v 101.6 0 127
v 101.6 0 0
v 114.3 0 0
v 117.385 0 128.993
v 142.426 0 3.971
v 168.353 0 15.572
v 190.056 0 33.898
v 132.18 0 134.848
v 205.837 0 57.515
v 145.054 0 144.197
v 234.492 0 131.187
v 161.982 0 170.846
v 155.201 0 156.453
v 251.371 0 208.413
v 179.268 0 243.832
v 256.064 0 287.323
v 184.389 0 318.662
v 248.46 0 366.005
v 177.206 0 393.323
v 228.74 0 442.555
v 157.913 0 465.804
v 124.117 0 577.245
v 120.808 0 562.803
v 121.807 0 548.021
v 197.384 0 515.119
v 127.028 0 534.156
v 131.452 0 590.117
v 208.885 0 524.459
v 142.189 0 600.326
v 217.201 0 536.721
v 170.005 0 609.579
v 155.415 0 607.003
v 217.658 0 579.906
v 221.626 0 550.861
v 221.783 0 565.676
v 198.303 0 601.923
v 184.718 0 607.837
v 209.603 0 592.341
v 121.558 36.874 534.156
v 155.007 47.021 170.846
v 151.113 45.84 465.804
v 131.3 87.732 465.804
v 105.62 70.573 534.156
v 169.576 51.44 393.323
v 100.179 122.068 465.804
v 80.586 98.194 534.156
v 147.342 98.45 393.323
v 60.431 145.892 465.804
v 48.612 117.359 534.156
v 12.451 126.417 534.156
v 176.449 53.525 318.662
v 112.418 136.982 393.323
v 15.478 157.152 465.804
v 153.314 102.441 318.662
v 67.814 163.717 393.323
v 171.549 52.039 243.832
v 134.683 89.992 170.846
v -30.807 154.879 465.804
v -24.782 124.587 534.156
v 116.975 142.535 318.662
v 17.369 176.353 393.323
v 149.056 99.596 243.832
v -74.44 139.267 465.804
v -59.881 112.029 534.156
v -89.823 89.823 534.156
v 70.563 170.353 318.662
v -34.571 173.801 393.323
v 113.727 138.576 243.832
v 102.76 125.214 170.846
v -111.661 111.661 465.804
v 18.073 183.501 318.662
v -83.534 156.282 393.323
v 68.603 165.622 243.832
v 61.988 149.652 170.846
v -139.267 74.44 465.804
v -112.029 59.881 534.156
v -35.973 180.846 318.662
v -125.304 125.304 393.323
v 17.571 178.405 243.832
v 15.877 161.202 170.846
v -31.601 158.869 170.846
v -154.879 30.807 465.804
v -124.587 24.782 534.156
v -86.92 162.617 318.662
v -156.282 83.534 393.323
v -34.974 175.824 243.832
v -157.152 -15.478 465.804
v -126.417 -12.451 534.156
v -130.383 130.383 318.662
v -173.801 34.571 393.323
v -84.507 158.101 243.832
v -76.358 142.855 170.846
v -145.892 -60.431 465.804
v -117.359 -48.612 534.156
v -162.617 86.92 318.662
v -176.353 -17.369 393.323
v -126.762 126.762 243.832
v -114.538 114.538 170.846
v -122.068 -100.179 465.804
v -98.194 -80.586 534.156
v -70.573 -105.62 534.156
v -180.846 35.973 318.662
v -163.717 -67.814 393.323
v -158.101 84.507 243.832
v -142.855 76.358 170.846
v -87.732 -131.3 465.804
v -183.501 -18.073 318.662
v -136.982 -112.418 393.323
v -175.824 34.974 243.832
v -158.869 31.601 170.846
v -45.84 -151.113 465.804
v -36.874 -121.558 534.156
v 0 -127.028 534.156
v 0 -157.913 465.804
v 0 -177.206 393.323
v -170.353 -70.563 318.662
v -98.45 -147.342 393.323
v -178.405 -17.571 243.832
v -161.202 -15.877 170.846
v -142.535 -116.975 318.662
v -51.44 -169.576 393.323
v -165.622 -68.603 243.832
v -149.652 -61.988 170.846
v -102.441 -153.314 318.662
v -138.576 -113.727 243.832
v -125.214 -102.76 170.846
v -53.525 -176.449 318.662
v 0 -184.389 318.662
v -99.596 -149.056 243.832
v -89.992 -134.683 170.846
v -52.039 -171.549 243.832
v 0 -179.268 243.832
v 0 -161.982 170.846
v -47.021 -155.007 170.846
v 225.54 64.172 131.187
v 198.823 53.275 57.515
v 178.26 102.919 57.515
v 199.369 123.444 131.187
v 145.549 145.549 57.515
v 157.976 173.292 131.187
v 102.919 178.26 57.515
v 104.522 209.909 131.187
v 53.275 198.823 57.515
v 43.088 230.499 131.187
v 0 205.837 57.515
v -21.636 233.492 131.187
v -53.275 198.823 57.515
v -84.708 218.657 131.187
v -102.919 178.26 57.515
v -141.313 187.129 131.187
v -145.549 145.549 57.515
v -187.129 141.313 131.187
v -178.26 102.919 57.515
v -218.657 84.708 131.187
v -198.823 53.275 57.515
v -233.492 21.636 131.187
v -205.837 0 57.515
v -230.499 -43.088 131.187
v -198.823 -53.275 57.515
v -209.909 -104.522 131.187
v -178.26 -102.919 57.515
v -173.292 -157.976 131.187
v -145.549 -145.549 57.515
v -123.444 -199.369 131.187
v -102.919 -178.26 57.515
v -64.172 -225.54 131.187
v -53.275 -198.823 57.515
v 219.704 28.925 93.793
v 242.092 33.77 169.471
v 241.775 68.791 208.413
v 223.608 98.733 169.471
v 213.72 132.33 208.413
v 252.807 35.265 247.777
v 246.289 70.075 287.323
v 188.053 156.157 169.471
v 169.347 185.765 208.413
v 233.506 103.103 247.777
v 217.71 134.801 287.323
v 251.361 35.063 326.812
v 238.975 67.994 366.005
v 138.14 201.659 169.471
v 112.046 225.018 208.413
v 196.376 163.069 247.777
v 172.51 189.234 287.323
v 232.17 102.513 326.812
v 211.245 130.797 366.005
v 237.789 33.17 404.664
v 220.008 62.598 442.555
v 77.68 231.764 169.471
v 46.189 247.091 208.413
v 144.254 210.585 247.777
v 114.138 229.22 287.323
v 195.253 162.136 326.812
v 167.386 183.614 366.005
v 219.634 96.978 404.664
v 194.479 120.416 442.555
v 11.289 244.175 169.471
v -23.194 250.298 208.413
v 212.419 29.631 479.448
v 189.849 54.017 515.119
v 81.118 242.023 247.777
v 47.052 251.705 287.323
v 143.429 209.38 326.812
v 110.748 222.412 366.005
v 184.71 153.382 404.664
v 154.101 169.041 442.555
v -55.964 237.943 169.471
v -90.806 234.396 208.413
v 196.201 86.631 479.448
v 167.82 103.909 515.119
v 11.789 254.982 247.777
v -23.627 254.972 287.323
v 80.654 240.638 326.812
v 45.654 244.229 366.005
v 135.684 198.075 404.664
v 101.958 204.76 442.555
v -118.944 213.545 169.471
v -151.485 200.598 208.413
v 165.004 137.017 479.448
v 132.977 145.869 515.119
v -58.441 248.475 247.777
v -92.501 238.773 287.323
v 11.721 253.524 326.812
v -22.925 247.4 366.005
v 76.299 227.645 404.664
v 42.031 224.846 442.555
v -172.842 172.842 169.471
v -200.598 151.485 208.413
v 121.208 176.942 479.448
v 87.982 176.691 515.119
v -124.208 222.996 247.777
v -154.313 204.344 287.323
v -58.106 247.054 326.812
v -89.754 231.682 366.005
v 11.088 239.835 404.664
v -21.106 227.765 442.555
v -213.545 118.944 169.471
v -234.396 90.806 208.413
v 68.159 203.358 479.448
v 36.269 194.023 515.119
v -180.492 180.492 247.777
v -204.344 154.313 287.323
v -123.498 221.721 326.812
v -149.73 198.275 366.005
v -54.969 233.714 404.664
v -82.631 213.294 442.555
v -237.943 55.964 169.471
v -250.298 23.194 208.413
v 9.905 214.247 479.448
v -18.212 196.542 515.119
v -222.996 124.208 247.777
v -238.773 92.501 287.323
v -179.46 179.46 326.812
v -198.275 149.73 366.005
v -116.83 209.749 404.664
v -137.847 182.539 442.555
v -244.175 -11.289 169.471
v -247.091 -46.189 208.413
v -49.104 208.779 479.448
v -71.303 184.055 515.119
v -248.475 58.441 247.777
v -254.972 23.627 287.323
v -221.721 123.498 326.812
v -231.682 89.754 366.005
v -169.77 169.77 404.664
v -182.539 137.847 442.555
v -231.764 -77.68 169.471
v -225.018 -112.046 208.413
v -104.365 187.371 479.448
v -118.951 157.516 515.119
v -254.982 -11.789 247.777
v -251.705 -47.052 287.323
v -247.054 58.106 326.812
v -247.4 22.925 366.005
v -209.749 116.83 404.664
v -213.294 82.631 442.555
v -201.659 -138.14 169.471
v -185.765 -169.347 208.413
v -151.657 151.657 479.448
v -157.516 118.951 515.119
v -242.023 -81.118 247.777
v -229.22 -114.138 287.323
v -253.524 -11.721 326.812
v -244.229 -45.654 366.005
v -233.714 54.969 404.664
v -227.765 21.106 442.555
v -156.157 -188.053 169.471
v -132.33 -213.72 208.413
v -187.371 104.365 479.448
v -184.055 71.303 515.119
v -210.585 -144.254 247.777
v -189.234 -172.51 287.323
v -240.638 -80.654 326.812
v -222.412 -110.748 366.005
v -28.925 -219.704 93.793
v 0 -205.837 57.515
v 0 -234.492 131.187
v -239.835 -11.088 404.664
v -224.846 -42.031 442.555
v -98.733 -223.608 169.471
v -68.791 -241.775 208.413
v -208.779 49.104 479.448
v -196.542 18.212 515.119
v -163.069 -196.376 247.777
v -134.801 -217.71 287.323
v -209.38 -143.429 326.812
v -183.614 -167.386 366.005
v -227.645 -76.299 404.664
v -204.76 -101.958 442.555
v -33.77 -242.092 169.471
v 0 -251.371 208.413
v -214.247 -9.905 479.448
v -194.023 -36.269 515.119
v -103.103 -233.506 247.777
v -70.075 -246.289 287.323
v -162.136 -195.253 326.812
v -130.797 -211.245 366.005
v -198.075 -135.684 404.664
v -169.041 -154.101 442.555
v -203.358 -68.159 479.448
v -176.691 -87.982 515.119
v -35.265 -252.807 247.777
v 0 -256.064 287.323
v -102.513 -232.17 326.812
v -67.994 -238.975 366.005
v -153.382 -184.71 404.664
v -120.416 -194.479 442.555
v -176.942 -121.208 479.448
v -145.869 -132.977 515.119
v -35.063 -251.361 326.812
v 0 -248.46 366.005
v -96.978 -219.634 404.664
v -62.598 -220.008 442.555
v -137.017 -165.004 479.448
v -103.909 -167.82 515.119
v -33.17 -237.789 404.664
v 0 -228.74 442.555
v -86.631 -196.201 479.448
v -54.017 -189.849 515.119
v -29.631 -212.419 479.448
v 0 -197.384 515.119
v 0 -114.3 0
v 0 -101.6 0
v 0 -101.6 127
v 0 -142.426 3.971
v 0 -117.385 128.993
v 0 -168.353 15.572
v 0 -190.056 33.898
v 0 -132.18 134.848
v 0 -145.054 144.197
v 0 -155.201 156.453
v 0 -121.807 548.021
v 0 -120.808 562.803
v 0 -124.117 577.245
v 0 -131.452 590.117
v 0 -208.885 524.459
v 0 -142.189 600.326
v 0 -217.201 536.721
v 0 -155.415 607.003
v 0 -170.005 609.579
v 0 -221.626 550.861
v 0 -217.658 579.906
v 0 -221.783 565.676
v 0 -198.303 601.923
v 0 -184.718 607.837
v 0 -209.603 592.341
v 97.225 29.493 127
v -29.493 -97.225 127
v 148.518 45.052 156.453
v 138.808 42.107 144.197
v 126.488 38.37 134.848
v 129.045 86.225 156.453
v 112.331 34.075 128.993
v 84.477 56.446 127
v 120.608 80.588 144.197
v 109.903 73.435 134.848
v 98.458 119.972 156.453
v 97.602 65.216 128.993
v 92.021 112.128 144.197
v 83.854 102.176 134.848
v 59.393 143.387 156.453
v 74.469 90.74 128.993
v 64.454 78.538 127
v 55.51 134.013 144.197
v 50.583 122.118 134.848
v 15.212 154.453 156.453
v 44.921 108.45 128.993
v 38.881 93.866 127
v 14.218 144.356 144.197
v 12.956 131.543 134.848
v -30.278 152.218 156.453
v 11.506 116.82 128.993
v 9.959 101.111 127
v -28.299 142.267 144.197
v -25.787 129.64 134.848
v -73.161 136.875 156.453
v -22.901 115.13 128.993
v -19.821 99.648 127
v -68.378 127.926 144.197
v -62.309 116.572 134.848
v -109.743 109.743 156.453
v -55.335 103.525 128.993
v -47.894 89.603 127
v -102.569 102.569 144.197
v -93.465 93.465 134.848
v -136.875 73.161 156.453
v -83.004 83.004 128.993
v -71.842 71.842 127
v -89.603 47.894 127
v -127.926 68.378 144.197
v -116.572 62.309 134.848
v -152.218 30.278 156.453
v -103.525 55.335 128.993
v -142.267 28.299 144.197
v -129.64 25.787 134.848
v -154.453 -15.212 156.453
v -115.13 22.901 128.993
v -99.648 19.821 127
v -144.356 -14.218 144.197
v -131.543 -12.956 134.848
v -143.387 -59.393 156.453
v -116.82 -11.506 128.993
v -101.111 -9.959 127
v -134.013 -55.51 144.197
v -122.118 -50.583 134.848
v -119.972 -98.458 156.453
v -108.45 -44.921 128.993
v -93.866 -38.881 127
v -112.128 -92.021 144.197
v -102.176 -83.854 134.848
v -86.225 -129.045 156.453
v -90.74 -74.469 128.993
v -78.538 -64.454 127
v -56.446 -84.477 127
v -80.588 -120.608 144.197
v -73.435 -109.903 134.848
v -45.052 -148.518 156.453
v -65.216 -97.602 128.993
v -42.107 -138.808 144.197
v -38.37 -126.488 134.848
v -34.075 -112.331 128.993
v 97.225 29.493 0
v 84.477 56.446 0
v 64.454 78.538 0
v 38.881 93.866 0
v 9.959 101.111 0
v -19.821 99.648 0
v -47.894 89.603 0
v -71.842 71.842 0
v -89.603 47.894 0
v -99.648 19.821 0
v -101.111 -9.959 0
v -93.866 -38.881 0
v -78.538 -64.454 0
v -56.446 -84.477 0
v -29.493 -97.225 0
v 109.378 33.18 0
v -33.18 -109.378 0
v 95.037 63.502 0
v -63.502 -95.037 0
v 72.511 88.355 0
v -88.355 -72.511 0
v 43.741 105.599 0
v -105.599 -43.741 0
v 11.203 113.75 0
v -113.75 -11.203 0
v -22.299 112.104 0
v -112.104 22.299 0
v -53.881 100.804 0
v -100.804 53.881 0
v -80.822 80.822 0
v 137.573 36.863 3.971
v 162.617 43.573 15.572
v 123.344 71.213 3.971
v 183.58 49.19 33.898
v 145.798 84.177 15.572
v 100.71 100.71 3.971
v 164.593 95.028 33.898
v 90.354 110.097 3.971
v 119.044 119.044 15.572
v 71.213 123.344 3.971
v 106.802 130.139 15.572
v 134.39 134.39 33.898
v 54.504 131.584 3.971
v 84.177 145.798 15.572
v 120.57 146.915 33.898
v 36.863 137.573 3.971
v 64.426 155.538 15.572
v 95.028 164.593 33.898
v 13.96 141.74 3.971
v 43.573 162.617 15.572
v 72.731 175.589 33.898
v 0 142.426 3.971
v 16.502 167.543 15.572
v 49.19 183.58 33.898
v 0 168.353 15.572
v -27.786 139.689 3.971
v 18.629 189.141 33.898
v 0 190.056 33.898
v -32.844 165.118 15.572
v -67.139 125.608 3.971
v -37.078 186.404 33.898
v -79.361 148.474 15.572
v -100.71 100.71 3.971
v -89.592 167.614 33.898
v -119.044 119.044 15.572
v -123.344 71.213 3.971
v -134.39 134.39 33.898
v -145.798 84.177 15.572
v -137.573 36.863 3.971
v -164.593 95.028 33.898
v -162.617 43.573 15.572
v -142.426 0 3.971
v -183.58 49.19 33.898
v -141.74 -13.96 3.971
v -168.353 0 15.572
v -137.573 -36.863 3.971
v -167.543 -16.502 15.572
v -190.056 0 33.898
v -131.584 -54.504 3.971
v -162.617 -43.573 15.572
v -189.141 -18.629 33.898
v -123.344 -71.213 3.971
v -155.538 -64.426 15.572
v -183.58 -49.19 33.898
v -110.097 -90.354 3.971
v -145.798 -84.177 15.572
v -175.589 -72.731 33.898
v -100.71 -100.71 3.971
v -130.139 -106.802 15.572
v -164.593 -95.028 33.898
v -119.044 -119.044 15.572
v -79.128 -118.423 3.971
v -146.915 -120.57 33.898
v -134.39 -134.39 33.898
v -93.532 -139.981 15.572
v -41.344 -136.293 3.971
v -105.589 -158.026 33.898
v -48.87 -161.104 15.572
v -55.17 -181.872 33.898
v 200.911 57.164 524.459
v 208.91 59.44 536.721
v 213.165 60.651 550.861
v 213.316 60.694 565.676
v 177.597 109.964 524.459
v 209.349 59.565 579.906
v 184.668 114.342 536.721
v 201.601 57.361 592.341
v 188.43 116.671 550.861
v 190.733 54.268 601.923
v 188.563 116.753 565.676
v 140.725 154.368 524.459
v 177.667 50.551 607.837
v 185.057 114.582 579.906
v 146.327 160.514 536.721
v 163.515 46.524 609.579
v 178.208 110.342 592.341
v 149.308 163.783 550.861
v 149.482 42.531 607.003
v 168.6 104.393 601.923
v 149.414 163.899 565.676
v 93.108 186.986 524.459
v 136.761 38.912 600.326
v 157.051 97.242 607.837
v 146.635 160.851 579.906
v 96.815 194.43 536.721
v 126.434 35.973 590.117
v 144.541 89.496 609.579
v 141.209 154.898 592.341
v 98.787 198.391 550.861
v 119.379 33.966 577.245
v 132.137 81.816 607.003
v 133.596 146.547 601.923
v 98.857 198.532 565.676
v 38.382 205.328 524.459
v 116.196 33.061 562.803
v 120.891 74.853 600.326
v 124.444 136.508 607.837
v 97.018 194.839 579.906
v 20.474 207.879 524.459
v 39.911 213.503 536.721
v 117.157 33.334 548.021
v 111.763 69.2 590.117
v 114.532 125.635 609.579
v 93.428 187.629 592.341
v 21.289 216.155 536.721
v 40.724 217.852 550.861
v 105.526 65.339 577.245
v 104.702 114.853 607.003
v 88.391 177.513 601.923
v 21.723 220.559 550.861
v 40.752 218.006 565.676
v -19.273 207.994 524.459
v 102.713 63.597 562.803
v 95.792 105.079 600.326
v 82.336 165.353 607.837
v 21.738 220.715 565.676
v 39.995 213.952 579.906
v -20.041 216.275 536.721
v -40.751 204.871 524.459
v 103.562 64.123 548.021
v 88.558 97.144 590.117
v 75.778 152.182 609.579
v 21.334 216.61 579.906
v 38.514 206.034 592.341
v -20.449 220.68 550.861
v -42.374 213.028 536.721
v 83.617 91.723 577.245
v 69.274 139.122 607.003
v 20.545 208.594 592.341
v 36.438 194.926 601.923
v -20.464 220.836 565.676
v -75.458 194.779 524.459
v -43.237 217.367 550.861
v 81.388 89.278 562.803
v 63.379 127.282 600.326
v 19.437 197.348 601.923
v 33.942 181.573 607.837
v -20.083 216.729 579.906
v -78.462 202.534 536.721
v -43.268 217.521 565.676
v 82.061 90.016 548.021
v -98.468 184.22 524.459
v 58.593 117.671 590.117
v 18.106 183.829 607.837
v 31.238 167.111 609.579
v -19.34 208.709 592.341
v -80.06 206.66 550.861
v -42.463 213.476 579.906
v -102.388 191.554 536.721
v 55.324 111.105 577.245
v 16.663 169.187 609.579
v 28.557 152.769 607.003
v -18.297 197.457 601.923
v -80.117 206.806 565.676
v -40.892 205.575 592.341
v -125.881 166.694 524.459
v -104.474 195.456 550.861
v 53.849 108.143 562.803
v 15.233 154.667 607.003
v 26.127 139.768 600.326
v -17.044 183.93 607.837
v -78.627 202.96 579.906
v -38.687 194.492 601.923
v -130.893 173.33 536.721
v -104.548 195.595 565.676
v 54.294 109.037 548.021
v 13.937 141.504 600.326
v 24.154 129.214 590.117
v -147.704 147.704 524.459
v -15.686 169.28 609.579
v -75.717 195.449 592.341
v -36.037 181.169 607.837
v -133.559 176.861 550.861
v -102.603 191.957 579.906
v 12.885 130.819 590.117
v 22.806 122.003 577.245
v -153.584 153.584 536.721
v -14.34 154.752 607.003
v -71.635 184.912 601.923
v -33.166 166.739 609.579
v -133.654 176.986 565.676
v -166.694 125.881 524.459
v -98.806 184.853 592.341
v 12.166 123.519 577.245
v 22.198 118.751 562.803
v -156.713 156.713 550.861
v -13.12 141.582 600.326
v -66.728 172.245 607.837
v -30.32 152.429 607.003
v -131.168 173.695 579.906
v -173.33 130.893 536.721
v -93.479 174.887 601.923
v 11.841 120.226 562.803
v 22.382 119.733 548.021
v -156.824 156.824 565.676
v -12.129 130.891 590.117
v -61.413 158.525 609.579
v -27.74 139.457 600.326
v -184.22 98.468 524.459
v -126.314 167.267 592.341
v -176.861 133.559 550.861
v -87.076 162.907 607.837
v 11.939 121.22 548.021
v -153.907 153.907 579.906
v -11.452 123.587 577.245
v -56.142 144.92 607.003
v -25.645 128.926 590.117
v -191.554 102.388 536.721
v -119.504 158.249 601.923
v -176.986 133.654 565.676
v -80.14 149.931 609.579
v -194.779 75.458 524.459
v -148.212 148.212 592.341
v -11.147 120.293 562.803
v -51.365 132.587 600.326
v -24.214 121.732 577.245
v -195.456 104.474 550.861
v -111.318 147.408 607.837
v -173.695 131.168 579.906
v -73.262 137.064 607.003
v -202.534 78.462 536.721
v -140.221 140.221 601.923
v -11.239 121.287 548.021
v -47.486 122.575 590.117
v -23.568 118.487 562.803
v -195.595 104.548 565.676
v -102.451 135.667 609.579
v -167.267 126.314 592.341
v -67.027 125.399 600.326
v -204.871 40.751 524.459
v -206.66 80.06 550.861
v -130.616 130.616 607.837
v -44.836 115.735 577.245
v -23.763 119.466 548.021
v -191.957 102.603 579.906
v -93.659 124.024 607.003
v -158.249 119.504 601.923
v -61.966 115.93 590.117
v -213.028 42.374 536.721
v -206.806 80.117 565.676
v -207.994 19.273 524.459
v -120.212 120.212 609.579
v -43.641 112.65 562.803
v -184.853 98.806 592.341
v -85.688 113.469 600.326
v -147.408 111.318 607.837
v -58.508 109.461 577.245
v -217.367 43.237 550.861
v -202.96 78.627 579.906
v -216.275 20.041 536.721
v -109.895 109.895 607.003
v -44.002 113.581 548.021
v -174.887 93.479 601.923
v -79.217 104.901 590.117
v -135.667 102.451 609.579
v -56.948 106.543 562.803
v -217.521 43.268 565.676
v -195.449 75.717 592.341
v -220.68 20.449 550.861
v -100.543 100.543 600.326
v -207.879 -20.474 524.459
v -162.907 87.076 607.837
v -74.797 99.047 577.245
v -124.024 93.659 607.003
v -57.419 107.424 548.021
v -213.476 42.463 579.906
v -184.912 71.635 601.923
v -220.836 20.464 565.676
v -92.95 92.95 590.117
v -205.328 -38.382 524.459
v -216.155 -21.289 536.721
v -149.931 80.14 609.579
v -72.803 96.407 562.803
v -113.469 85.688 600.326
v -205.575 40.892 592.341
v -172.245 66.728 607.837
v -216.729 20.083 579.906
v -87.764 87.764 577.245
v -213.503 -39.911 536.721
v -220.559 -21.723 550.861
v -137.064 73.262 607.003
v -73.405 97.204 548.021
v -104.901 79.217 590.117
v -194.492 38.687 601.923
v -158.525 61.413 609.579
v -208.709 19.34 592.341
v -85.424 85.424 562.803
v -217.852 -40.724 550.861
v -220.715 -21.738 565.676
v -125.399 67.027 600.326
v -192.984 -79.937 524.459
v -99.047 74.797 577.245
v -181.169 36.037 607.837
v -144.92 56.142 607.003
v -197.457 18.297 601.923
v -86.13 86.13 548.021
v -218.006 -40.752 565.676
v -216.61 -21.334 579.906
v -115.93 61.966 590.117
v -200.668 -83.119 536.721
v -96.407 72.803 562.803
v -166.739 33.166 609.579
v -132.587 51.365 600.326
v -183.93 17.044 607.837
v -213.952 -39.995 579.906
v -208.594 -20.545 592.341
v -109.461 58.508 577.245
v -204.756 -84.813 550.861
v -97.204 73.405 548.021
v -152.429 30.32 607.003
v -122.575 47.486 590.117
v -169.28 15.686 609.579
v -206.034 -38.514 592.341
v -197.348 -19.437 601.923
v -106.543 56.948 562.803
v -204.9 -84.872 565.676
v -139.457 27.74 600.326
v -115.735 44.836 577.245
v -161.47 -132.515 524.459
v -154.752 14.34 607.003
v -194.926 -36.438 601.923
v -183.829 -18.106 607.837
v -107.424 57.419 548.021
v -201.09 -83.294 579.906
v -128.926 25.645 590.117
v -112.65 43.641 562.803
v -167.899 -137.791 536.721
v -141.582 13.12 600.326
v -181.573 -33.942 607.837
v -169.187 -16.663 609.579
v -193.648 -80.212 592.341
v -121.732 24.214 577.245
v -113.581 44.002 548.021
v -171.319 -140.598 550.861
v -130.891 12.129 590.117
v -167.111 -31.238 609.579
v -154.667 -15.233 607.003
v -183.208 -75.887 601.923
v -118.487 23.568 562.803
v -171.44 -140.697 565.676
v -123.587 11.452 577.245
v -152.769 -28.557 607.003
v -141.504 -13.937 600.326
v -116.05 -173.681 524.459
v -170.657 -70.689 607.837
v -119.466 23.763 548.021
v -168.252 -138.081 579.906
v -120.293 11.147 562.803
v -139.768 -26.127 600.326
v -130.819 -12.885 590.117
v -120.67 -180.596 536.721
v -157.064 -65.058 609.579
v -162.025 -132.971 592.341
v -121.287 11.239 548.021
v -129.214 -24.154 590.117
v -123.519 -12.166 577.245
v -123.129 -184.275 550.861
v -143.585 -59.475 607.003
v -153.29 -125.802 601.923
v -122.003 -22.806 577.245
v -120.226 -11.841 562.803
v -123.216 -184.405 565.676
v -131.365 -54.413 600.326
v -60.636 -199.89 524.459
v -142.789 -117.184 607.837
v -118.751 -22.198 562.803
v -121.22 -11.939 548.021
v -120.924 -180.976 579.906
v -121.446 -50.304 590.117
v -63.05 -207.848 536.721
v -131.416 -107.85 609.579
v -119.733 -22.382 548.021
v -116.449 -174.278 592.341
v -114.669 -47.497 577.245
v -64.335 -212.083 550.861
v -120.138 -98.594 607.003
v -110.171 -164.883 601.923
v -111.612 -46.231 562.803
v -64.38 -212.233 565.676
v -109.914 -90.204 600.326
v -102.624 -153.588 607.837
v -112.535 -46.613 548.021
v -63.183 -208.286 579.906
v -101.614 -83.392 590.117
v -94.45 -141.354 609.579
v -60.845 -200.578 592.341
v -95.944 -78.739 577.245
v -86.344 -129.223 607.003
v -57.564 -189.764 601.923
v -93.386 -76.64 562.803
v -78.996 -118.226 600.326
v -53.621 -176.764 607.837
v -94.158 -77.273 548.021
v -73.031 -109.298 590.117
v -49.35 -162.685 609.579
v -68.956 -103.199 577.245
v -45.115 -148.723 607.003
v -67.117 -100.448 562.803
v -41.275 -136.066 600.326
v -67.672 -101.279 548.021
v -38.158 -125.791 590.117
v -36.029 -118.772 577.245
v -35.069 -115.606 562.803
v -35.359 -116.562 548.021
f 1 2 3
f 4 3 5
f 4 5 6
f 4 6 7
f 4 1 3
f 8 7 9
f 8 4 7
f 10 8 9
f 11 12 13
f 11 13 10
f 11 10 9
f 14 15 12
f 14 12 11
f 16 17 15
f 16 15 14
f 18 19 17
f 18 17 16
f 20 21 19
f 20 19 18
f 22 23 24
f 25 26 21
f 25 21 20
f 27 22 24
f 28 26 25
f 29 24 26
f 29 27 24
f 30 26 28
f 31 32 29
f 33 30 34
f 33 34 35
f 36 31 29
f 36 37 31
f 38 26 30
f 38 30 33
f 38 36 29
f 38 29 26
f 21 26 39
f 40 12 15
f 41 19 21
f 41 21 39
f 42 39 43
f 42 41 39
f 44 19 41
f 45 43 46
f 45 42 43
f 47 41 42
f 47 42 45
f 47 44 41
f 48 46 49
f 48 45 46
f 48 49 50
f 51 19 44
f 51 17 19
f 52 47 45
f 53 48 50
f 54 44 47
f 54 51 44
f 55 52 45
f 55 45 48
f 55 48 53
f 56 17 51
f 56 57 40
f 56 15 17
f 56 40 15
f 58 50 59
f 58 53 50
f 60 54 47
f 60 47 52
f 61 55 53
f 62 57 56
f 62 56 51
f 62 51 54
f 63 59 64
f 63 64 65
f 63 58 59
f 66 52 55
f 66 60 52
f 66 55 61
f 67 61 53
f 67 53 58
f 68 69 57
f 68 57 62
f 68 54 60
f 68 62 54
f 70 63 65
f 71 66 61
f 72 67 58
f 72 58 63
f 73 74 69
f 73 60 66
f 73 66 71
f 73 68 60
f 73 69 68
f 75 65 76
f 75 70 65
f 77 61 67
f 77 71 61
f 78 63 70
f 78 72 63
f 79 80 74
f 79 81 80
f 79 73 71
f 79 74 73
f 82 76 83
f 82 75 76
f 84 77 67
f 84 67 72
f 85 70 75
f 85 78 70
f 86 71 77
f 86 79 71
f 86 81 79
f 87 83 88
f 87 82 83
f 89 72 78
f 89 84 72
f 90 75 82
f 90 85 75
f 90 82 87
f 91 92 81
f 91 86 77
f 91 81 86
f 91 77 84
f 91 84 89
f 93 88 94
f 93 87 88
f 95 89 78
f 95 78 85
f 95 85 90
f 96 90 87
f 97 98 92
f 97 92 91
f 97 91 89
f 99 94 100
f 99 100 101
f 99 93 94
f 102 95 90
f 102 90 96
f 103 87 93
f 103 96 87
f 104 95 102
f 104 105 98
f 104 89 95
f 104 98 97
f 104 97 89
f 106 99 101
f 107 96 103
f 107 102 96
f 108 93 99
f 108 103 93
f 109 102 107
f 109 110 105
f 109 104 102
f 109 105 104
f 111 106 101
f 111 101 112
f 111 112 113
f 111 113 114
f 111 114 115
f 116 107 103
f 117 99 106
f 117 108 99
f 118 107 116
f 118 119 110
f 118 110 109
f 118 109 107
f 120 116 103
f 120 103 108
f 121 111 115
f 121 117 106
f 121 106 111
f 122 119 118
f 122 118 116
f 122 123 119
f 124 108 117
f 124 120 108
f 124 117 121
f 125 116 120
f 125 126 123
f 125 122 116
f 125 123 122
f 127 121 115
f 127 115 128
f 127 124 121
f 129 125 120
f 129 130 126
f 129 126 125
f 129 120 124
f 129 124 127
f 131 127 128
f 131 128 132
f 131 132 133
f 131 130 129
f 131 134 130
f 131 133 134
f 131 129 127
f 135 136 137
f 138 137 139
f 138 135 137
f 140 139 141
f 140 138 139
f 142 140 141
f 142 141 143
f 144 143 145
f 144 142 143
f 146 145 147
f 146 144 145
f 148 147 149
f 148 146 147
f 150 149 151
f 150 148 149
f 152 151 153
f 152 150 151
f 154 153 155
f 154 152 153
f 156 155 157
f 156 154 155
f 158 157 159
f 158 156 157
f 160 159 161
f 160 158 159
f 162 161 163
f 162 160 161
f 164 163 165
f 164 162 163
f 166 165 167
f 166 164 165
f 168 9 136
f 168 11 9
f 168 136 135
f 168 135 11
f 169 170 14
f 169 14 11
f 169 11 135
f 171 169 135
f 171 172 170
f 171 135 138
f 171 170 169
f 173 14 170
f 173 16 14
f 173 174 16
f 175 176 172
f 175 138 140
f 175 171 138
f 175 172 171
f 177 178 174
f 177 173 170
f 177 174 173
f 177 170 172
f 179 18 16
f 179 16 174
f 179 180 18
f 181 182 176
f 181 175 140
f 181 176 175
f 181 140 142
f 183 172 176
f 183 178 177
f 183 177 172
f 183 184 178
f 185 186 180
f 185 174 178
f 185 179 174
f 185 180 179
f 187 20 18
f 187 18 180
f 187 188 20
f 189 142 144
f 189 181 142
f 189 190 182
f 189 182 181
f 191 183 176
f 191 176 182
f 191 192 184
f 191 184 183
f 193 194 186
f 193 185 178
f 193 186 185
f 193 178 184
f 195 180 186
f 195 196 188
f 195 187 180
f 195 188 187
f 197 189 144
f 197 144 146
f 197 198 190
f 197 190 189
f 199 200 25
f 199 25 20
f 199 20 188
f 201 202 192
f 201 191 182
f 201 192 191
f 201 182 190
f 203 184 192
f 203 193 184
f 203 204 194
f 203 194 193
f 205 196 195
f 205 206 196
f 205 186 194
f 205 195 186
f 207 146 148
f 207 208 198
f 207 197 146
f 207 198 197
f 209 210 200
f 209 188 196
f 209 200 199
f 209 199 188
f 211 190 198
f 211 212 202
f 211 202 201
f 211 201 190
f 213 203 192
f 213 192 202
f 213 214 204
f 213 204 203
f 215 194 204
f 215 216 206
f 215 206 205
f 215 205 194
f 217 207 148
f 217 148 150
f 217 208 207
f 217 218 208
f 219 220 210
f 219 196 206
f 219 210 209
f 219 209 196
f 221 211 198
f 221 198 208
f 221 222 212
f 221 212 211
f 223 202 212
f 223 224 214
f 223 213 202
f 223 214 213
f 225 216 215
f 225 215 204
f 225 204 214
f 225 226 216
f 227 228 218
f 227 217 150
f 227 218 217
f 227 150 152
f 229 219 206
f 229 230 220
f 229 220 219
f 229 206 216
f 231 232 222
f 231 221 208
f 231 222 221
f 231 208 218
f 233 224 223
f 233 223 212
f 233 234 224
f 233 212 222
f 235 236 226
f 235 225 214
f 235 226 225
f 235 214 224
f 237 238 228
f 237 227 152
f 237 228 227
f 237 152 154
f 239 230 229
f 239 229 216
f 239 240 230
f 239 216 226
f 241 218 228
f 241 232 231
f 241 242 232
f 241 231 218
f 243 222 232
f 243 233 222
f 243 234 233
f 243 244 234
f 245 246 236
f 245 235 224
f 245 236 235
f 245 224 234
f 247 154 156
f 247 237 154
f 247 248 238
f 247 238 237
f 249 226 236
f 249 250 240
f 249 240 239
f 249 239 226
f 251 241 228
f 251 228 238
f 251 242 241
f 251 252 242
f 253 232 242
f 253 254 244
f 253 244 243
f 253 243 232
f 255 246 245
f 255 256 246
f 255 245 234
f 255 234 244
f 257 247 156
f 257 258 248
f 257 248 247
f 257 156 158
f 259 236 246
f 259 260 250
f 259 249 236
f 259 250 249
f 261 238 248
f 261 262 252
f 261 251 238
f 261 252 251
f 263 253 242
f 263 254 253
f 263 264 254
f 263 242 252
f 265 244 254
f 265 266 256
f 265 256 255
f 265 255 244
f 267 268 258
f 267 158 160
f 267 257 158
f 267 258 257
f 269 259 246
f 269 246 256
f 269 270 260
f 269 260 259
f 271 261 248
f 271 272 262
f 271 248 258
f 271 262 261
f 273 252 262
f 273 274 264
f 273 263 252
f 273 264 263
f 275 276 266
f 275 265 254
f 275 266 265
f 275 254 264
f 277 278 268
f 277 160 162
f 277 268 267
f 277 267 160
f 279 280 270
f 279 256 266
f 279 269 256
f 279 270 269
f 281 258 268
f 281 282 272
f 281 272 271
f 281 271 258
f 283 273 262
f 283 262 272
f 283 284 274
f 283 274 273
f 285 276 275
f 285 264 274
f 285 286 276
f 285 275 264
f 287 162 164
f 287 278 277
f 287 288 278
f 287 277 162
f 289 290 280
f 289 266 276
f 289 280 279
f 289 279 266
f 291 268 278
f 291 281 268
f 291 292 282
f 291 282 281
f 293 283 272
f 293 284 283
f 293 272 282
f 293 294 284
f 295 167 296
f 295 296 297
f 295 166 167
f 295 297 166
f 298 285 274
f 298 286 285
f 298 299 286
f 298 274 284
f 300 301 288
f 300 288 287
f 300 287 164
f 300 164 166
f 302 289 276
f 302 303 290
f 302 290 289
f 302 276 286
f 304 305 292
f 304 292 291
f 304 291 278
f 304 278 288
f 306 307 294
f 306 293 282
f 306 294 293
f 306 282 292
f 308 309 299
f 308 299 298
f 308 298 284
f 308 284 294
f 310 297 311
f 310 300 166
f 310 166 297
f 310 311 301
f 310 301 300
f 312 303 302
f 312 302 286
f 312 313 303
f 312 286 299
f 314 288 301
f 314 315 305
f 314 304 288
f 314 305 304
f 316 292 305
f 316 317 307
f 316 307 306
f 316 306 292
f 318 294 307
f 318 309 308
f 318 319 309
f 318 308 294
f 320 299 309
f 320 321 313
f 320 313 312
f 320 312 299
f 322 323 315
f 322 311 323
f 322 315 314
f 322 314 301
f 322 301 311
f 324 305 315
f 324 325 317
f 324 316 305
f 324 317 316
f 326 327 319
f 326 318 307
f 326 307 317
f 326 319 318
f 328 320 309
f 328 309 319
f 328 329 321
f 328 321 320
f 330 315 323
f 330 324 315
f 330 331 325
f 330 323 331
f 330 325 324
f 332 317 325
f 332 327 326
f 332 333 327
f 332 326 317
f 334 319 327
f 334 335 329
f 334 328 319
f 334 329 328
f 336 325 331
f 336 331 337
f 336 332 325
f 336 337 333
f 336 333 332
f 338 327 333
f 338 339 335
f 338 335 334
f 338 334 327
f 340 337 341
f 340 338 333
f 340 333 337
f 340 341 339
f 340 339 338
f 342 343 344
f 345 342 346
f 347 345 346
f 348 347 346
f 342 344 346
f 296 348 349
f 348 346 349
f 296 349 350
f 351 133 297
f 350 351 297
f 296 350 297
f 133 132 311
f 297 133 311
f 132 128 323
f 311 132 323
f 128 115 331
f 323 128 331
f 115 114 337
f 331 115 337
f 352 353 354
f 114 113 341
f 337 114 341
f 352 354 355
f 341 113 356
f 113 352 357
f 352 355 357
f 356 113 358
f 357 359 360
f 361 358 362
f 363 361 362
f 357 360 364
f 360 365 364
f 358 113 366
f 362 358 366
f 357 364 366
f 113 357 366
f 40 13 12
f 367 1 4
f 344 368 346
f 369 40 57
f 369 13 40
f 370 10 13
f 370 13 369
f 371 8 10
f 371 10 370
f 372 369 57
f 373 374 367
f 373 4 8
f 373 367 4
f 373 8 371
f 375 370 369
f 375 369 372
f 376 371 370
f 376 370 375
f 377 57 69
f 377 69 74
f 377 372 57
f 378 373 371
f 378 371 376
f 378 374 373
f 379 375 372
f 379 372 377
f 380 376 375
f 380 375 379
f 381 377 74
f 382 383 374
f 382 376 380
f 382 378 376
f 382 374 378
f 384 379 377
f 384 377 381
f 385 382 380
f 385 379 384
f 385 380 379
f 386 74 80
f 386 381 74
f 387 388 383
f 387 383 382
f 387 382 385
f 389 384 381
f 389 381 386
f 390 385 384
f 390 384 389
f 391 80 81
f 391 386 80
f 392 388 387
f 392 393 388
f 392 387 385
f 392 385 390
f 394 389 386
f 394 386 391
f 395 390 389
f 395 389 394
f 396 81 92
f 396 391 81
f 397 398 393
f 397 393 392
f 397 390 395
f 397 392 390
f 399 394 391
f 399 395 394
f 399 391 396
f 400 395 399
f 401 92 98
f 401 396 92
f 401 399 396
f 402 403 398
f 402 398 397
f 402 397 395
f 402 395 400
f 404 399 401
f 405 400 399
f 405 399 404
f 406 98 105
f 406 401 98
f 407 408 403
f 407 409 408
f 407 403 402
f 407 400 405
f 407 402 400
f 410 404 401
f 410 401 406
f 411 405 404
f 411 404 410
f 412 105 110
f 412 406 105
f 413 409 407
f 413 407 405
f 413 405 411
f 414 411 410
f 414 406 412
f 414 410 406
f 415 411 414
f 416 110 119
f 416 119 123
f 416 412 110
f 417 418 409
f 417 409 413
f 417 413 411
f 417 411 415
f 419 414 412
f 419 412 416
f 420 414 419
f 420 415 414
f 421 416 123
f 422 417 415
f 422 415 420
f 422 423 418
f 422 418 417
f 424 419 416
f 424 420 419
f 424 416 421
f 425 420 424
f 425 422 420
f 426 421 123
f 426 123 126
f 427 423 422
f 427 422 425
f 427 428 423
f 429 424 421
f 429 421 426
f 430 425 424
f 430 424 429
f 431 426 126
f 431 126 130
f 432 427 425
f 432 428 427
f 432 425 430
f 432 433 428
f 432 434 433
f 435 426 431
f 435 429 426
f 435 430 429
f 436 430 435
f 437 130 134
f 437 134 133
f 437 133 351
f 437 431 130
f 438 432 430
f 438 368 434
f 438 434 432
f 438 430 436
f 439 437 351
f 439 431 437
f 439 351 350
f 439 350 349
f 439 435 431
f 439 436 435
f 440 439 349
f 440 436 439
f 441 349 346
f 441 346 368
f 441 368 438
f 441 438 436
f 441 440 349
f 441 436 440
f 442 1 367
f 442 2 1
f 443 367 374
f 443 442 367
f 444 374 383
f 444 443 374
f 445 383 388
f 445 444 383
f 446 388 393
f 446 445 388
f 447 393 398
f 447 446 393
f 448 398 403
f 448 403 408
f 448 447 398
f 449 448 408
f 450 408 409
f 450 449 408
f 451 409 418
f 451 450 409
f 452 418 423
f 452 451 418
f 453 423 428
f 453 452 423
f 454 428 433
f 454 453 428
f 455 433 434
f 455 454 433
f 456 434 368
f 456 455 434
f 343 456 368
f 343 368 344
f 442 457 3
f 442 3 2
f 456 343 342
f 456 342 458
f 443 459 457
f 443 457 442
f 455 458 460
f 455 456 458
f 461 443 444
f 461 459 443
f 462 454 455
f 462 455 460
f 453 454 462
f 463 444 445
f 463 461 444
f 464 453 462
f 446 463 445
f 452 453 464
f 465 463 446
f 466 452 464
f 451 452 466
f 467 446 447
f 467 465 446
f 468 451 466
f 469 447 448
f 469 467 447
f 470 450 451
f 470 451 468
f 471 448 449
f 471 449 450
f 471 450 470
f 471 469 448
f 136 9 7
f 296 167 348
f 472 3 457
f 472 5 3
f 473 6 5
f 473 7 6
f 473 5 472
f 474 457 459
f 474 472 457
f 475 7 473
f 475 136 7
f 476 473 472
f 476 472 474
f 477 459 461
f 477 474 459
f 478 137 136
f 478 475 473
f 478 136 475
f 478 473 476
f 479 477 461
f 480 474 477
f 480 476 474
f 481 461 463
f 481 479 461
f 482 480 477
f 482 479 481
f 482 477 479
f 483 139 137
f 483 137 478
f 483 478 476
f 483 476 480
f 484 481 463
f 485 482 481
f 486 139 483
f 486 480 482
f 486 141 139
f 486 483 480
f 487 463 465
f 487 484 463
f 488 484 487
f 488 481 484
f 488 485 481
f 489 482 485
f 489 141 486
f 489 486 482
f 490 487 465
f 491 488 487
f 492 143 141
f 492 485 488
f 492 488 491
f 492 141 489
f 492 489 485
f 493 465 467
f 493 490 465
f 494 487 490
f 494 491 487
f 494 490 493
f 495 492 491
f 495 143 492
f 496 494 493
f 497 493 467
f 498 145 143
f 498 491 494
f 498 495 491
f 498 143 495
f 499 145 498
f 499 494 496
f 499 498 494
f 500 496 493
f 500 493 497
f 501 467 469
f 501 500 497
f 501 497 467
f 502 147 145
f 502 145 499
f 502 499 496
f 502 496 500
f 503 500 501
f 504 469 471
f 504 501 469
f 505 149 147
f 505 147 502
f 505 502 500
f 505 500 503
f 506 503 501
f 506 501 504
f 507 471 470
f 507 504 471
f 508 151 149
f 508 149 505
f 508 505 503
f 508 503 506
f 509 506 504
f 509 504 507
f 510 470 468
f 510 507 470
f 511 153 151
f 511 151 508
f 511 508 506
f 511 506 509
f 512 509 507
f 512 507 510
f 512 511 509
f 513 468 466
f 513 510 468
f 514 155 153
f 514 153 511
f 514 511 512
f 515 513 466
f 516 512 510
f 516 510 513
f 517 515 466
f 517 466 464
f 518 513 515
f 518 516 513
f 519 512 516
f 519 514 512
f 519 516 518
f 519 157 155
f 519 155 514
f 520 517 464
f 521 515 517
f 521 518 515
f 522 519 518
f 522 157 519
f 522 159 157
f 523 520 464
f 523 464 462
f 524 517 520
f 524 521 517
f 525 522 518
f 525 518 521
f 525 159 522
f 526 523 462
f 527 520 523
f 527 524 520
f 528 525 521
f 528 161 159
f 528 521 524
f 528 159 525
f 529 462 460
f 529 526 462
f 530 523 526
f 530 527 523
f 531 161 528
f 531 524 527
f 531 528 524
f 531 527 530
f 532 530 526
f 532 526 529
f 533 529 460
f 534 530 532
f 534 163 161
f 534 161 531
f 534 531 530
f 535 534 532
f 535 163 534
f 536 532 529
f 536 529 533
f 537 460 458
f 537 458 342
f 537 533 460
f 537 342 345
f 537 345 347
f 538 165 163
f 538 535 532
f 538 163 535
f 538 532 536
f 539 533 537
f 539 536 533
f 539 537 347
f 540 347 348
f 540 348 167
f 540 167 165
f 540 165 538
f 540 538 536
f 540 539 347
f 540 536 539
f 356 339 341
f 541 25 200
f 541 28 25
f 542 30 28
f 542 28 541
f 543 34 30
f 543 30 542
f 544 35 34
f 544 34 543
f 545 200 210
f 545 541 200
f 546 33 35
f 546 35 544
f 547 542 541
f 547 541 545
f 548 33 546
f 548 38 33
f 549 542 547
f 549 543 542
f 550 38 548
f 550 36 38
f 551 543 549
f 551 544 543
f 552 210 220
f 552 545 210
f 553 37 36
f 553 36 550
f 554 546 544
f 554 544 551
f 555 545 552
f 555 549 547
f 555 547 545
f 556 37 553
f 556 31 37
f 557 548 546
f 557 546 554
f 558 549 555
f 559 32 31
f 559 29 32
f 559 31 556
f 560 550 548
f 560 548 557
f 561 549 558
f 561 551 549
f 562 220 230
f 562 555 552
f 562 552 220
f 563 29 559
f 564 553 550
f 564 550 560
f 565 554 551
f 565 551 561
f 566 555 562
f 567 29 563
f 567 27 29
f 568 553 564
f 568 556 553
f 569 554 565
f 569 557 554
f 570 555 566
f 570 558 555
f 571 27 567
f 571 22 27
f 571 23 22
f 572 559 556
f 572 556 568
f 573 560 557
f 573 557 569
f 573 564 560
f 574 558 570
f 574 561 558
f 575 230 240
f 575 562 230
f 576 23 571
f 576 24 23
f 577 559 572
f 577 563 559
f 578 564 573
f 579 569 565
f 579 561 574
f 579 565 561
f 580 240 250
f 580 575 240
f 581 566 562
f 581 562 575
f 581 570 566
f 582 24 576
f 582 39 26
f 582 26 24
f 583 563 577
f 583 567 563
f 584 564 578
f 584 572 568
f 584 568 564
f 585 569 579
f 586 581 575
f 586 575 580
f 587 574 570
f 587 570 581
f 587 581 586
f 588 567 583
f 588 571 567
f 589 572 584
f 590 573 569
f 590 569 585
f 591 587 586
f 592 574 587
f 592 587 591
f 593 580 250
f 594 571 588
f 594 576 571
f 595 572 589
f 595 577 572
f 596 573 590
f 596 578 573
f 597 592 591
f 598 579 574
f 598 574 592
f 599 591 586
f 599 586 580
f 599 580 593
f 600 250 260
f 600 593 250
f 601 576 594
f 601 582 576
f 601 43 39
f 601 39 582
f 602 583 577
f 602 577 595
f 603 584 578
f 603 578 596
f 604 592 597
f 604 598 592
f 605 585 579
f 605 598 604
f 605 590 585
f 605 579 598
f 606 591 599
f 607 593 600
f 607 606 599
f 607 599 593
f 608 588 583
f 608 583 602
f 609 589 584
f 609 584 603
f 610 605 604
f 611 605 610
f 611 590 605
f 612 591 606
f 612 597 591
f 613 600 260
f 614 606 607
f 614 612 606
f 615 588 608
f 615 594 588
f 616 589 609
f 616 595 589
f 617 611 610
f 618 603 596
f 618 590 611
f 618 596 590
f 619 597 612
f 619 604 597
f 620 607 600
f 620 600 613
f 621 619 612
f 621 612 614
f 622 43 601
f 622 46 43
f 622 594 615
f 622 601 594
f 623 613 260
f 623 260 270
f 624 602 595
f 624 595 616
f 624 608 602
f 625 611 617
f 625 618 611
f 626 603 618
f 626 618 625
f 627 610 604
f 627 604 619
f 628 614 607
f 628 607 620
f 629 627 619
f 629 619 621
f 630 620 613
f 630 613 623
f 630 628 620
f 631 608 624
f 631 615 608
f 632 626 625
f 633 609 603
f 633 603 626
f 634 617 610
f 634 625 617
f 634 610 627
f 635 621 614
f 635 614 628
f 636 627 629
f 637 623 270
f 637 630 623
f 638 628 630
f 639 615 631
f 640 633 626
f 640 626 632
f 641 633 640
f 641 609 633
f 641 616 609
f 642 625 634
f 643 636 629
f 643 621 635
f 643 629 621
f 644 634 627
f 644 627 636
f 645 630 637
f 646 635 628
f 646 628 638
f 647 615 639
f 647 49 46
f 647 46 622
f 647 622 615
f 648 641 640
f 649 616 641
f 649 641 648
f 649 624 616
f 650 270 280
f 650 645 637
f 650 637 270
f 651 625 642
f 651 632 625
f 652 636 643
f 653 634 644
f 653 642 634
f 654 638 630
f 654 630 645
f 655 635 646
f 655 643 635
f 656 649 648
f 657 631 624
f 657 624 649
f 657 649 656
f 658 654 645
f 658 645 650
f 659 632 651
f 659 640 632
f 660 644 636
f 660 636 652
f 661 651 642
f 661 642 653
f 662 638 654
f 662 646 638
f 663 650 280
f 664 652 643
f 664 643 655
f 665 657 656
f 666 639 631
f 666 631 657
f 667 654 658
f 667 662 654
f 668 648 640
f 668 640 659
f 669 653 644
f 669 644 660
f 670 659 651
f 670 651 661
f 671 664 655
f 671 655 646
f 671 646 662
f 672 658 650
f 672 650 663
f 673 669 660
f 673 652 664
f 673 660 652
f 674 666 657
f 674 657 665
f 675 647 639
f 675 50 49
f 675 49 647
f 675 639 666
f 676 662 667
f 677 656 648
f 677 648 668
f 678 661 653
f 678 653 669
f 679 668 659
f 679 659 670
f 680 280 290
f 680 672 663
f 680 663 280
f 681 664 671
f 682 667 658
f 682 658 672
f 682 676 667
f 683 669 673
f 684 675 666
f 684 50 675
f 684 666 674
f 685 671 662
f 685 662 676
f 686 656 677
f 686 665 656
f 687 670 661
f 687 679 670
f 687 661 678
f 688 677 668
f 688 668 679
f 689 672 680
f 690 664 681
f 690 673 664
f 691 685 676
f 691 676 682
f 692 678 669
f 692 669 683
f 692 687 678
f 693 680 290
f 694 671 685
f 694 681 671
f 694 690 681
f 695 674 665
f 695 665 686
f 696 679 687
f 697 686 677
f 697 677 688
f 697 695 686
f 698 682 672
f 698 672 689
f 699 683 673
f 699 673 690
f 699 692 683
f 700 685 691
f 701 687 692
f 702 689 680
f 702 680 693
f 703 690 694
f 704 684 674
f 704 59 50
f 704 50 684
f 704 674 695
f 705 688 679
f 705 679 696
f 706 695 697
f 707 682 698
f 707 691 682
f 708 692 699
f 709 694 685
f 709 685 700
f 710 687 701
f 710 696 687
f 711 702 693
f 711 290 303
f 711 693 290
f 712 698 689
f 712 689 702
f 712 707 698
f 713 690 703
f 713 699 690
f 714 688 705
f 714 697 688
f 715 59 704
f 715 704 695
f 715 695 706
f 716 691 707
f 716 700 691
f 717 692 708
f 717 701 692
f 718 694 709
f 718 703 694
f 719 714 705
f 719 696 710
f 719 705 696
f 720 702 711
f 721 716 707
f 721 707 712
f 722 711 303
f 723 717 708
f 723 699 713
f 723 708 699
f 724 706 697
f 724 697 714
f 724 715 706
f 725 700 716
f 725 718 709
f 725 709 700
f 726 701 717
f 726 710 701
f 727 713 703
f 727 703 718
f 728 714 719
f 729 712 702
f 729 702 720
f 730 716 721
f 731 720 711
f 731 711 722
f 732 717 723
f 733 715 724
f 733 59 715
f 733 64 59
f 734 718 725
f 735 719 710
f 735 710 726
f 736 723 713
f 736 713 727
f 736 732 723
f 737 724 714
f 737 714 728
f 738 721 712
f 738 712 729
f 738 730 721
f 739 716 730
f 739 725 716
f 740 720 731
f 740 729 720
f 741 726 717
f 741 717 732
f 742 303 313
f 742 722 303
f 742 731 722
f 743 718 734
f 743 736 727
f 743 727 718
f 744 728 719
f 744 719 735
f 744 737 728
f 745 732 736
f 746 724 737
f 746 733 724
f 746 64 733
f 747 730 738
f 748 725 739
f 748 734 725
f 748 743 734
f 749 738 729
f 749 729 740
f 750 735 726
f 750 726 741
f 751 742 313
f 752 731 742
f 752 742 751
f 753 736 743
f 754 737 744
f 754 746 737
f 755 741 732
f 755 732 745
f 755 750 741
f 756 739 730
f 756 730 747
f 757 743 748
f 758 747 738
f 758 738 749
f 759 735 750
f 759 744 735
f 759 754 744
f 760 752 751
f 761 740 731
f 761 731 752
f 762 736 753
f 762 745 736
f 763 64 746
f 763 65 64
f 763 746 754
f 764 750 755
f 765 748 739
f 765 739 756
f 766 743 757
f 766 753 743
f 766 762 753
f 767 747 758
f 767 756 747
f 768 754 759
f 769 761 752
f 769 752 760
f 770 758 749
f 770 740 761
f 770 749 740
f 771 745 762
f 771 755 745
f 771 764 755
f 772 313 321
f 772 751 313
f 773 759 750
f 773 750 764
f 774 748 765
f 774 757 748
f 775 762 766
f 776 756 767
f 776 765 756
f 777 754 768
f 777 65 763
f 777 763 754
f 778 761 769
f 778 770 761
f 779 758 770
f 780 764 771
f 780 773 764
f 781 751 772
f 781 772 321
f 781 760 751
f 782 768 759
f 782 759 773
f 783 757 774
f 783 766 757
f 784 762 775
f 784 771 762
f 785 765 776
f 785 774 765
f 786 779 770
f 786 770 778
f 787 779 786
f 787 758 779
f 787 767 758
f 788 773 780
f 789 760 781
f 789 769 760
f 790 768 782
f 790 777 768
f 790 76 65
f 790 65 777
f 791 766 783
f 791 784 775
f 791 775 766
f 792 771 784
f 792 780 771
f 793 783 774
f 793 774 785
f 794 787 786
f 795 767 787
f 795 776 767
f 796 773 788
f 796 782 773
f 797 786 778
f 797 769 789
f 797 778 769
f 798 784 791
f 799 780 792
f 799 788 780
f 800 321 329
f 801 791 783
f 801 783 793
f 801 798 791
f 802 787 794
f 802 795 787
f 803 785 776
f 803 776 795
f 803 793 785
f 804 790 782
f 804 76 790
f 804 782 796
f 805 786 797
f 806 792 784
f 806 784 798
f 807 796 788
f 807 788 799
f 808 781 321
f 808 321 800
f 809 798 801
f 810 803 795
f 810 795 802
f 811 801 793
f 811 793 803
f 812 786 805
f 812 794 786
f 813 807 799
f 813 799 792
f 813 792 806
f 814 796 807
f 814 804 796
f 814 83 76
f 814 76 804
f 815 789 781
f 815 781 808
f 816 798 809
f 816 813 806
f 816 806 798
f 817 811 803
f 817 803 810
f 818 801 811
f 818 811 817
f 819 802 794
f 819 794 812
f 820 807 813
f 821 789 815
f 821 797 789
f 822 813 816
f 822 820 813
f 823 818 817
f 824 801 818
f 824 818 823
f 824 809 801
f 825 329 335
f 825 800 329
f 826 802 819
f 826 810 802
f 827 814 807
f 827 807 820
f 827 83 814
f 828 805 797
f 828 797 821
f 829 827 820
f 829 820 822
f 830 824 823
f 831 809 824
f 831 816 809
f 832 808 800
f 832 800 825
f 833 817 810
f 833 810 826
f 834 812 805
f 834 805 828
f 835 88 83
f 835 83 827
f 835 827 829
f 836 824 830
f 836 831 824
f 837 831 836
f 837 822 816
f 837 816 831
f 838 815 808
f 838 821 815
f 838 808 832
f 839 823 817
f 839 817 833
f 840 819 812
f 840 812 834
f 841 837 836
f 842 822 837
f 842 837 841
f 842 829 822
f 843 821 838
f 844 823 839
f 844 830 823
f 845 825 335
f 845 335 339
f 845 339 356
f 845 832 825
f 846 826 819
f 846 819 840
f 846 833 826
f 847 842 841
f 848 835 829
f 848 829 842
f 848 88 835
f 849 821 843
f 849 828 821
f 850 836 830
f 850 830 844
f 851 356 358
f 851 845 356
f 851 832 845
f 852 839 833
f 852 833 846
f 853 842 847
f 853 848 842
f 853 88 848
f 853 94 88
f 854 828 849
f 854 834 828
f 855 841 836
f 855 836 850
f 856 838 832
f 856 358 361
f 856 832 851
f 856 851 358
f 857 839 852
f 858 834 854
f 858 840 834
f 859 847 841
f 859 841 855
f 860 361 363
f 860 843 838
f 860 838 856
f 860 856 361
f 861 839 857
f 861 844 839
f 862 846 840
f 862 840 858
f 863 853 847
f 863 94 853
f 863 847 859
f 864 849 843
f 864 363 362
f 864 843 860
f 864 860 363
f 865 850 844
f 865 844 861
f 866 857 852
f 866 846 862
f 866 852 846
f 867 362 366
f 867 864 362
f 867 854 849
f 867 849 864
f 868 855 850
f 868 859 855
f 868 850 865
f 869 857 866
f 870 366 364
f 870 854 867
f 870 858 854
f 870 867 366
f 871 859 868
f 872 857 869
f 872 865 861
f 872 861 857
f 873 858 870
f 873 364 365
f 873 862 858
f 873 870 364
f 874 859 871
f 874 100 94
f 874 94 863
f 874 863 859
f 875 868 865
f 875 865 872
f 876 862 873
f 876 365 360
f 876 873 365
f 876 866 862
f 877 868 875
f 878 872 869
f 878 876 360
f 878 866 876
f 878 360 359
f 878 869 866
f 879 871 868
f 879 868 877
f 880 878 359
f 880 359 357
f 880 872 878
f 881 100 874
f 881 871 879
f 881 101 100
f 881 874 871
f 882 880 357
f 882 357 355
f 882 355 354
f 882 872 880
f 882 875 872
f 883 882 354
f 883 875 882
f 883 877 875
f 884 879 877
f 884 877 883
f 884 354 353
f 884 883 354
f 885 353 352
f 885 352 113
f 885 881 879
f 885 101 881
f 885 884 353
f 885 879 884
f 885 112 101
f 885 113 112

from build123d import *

# Parameters (mm, degrees)
F1_ANGLE = 270


with BuildPart() as f1:
    # F0 (on Front) → F1 (revolve)
    with BuildSketch(Plane.XZ):
        with BuildLine():
            ThreePointArc((161.981836, 170.845895), (138.910952, 139.11768), (101.6, 127))
            Line((101.6, 127), (101.6, 0))
            Line((101.6, 0), (114.3, 0))
            ThreePointArc((114.3, 0), (168.353269, 15.572073), (205.837217, 57.514879))
            ThreePointArc((205.837217, 57.514879), (256.064485, 287.322693), (197.384328, 515.118761))
            ThreePointArc((197.384328, 515.118761), (184.718228, 607.836661), (127.028262, 534.155545))
            ThreePointArc((127.028262, 534.155545), (182.331241, 356.139931), (161.981836, 170.845895))
        make_face()
    revolve(axis=Axis((0, 0, 359.91569), (0, 0, 1)), revolution_arc=F1_ANGLE)


solid = f1.part
